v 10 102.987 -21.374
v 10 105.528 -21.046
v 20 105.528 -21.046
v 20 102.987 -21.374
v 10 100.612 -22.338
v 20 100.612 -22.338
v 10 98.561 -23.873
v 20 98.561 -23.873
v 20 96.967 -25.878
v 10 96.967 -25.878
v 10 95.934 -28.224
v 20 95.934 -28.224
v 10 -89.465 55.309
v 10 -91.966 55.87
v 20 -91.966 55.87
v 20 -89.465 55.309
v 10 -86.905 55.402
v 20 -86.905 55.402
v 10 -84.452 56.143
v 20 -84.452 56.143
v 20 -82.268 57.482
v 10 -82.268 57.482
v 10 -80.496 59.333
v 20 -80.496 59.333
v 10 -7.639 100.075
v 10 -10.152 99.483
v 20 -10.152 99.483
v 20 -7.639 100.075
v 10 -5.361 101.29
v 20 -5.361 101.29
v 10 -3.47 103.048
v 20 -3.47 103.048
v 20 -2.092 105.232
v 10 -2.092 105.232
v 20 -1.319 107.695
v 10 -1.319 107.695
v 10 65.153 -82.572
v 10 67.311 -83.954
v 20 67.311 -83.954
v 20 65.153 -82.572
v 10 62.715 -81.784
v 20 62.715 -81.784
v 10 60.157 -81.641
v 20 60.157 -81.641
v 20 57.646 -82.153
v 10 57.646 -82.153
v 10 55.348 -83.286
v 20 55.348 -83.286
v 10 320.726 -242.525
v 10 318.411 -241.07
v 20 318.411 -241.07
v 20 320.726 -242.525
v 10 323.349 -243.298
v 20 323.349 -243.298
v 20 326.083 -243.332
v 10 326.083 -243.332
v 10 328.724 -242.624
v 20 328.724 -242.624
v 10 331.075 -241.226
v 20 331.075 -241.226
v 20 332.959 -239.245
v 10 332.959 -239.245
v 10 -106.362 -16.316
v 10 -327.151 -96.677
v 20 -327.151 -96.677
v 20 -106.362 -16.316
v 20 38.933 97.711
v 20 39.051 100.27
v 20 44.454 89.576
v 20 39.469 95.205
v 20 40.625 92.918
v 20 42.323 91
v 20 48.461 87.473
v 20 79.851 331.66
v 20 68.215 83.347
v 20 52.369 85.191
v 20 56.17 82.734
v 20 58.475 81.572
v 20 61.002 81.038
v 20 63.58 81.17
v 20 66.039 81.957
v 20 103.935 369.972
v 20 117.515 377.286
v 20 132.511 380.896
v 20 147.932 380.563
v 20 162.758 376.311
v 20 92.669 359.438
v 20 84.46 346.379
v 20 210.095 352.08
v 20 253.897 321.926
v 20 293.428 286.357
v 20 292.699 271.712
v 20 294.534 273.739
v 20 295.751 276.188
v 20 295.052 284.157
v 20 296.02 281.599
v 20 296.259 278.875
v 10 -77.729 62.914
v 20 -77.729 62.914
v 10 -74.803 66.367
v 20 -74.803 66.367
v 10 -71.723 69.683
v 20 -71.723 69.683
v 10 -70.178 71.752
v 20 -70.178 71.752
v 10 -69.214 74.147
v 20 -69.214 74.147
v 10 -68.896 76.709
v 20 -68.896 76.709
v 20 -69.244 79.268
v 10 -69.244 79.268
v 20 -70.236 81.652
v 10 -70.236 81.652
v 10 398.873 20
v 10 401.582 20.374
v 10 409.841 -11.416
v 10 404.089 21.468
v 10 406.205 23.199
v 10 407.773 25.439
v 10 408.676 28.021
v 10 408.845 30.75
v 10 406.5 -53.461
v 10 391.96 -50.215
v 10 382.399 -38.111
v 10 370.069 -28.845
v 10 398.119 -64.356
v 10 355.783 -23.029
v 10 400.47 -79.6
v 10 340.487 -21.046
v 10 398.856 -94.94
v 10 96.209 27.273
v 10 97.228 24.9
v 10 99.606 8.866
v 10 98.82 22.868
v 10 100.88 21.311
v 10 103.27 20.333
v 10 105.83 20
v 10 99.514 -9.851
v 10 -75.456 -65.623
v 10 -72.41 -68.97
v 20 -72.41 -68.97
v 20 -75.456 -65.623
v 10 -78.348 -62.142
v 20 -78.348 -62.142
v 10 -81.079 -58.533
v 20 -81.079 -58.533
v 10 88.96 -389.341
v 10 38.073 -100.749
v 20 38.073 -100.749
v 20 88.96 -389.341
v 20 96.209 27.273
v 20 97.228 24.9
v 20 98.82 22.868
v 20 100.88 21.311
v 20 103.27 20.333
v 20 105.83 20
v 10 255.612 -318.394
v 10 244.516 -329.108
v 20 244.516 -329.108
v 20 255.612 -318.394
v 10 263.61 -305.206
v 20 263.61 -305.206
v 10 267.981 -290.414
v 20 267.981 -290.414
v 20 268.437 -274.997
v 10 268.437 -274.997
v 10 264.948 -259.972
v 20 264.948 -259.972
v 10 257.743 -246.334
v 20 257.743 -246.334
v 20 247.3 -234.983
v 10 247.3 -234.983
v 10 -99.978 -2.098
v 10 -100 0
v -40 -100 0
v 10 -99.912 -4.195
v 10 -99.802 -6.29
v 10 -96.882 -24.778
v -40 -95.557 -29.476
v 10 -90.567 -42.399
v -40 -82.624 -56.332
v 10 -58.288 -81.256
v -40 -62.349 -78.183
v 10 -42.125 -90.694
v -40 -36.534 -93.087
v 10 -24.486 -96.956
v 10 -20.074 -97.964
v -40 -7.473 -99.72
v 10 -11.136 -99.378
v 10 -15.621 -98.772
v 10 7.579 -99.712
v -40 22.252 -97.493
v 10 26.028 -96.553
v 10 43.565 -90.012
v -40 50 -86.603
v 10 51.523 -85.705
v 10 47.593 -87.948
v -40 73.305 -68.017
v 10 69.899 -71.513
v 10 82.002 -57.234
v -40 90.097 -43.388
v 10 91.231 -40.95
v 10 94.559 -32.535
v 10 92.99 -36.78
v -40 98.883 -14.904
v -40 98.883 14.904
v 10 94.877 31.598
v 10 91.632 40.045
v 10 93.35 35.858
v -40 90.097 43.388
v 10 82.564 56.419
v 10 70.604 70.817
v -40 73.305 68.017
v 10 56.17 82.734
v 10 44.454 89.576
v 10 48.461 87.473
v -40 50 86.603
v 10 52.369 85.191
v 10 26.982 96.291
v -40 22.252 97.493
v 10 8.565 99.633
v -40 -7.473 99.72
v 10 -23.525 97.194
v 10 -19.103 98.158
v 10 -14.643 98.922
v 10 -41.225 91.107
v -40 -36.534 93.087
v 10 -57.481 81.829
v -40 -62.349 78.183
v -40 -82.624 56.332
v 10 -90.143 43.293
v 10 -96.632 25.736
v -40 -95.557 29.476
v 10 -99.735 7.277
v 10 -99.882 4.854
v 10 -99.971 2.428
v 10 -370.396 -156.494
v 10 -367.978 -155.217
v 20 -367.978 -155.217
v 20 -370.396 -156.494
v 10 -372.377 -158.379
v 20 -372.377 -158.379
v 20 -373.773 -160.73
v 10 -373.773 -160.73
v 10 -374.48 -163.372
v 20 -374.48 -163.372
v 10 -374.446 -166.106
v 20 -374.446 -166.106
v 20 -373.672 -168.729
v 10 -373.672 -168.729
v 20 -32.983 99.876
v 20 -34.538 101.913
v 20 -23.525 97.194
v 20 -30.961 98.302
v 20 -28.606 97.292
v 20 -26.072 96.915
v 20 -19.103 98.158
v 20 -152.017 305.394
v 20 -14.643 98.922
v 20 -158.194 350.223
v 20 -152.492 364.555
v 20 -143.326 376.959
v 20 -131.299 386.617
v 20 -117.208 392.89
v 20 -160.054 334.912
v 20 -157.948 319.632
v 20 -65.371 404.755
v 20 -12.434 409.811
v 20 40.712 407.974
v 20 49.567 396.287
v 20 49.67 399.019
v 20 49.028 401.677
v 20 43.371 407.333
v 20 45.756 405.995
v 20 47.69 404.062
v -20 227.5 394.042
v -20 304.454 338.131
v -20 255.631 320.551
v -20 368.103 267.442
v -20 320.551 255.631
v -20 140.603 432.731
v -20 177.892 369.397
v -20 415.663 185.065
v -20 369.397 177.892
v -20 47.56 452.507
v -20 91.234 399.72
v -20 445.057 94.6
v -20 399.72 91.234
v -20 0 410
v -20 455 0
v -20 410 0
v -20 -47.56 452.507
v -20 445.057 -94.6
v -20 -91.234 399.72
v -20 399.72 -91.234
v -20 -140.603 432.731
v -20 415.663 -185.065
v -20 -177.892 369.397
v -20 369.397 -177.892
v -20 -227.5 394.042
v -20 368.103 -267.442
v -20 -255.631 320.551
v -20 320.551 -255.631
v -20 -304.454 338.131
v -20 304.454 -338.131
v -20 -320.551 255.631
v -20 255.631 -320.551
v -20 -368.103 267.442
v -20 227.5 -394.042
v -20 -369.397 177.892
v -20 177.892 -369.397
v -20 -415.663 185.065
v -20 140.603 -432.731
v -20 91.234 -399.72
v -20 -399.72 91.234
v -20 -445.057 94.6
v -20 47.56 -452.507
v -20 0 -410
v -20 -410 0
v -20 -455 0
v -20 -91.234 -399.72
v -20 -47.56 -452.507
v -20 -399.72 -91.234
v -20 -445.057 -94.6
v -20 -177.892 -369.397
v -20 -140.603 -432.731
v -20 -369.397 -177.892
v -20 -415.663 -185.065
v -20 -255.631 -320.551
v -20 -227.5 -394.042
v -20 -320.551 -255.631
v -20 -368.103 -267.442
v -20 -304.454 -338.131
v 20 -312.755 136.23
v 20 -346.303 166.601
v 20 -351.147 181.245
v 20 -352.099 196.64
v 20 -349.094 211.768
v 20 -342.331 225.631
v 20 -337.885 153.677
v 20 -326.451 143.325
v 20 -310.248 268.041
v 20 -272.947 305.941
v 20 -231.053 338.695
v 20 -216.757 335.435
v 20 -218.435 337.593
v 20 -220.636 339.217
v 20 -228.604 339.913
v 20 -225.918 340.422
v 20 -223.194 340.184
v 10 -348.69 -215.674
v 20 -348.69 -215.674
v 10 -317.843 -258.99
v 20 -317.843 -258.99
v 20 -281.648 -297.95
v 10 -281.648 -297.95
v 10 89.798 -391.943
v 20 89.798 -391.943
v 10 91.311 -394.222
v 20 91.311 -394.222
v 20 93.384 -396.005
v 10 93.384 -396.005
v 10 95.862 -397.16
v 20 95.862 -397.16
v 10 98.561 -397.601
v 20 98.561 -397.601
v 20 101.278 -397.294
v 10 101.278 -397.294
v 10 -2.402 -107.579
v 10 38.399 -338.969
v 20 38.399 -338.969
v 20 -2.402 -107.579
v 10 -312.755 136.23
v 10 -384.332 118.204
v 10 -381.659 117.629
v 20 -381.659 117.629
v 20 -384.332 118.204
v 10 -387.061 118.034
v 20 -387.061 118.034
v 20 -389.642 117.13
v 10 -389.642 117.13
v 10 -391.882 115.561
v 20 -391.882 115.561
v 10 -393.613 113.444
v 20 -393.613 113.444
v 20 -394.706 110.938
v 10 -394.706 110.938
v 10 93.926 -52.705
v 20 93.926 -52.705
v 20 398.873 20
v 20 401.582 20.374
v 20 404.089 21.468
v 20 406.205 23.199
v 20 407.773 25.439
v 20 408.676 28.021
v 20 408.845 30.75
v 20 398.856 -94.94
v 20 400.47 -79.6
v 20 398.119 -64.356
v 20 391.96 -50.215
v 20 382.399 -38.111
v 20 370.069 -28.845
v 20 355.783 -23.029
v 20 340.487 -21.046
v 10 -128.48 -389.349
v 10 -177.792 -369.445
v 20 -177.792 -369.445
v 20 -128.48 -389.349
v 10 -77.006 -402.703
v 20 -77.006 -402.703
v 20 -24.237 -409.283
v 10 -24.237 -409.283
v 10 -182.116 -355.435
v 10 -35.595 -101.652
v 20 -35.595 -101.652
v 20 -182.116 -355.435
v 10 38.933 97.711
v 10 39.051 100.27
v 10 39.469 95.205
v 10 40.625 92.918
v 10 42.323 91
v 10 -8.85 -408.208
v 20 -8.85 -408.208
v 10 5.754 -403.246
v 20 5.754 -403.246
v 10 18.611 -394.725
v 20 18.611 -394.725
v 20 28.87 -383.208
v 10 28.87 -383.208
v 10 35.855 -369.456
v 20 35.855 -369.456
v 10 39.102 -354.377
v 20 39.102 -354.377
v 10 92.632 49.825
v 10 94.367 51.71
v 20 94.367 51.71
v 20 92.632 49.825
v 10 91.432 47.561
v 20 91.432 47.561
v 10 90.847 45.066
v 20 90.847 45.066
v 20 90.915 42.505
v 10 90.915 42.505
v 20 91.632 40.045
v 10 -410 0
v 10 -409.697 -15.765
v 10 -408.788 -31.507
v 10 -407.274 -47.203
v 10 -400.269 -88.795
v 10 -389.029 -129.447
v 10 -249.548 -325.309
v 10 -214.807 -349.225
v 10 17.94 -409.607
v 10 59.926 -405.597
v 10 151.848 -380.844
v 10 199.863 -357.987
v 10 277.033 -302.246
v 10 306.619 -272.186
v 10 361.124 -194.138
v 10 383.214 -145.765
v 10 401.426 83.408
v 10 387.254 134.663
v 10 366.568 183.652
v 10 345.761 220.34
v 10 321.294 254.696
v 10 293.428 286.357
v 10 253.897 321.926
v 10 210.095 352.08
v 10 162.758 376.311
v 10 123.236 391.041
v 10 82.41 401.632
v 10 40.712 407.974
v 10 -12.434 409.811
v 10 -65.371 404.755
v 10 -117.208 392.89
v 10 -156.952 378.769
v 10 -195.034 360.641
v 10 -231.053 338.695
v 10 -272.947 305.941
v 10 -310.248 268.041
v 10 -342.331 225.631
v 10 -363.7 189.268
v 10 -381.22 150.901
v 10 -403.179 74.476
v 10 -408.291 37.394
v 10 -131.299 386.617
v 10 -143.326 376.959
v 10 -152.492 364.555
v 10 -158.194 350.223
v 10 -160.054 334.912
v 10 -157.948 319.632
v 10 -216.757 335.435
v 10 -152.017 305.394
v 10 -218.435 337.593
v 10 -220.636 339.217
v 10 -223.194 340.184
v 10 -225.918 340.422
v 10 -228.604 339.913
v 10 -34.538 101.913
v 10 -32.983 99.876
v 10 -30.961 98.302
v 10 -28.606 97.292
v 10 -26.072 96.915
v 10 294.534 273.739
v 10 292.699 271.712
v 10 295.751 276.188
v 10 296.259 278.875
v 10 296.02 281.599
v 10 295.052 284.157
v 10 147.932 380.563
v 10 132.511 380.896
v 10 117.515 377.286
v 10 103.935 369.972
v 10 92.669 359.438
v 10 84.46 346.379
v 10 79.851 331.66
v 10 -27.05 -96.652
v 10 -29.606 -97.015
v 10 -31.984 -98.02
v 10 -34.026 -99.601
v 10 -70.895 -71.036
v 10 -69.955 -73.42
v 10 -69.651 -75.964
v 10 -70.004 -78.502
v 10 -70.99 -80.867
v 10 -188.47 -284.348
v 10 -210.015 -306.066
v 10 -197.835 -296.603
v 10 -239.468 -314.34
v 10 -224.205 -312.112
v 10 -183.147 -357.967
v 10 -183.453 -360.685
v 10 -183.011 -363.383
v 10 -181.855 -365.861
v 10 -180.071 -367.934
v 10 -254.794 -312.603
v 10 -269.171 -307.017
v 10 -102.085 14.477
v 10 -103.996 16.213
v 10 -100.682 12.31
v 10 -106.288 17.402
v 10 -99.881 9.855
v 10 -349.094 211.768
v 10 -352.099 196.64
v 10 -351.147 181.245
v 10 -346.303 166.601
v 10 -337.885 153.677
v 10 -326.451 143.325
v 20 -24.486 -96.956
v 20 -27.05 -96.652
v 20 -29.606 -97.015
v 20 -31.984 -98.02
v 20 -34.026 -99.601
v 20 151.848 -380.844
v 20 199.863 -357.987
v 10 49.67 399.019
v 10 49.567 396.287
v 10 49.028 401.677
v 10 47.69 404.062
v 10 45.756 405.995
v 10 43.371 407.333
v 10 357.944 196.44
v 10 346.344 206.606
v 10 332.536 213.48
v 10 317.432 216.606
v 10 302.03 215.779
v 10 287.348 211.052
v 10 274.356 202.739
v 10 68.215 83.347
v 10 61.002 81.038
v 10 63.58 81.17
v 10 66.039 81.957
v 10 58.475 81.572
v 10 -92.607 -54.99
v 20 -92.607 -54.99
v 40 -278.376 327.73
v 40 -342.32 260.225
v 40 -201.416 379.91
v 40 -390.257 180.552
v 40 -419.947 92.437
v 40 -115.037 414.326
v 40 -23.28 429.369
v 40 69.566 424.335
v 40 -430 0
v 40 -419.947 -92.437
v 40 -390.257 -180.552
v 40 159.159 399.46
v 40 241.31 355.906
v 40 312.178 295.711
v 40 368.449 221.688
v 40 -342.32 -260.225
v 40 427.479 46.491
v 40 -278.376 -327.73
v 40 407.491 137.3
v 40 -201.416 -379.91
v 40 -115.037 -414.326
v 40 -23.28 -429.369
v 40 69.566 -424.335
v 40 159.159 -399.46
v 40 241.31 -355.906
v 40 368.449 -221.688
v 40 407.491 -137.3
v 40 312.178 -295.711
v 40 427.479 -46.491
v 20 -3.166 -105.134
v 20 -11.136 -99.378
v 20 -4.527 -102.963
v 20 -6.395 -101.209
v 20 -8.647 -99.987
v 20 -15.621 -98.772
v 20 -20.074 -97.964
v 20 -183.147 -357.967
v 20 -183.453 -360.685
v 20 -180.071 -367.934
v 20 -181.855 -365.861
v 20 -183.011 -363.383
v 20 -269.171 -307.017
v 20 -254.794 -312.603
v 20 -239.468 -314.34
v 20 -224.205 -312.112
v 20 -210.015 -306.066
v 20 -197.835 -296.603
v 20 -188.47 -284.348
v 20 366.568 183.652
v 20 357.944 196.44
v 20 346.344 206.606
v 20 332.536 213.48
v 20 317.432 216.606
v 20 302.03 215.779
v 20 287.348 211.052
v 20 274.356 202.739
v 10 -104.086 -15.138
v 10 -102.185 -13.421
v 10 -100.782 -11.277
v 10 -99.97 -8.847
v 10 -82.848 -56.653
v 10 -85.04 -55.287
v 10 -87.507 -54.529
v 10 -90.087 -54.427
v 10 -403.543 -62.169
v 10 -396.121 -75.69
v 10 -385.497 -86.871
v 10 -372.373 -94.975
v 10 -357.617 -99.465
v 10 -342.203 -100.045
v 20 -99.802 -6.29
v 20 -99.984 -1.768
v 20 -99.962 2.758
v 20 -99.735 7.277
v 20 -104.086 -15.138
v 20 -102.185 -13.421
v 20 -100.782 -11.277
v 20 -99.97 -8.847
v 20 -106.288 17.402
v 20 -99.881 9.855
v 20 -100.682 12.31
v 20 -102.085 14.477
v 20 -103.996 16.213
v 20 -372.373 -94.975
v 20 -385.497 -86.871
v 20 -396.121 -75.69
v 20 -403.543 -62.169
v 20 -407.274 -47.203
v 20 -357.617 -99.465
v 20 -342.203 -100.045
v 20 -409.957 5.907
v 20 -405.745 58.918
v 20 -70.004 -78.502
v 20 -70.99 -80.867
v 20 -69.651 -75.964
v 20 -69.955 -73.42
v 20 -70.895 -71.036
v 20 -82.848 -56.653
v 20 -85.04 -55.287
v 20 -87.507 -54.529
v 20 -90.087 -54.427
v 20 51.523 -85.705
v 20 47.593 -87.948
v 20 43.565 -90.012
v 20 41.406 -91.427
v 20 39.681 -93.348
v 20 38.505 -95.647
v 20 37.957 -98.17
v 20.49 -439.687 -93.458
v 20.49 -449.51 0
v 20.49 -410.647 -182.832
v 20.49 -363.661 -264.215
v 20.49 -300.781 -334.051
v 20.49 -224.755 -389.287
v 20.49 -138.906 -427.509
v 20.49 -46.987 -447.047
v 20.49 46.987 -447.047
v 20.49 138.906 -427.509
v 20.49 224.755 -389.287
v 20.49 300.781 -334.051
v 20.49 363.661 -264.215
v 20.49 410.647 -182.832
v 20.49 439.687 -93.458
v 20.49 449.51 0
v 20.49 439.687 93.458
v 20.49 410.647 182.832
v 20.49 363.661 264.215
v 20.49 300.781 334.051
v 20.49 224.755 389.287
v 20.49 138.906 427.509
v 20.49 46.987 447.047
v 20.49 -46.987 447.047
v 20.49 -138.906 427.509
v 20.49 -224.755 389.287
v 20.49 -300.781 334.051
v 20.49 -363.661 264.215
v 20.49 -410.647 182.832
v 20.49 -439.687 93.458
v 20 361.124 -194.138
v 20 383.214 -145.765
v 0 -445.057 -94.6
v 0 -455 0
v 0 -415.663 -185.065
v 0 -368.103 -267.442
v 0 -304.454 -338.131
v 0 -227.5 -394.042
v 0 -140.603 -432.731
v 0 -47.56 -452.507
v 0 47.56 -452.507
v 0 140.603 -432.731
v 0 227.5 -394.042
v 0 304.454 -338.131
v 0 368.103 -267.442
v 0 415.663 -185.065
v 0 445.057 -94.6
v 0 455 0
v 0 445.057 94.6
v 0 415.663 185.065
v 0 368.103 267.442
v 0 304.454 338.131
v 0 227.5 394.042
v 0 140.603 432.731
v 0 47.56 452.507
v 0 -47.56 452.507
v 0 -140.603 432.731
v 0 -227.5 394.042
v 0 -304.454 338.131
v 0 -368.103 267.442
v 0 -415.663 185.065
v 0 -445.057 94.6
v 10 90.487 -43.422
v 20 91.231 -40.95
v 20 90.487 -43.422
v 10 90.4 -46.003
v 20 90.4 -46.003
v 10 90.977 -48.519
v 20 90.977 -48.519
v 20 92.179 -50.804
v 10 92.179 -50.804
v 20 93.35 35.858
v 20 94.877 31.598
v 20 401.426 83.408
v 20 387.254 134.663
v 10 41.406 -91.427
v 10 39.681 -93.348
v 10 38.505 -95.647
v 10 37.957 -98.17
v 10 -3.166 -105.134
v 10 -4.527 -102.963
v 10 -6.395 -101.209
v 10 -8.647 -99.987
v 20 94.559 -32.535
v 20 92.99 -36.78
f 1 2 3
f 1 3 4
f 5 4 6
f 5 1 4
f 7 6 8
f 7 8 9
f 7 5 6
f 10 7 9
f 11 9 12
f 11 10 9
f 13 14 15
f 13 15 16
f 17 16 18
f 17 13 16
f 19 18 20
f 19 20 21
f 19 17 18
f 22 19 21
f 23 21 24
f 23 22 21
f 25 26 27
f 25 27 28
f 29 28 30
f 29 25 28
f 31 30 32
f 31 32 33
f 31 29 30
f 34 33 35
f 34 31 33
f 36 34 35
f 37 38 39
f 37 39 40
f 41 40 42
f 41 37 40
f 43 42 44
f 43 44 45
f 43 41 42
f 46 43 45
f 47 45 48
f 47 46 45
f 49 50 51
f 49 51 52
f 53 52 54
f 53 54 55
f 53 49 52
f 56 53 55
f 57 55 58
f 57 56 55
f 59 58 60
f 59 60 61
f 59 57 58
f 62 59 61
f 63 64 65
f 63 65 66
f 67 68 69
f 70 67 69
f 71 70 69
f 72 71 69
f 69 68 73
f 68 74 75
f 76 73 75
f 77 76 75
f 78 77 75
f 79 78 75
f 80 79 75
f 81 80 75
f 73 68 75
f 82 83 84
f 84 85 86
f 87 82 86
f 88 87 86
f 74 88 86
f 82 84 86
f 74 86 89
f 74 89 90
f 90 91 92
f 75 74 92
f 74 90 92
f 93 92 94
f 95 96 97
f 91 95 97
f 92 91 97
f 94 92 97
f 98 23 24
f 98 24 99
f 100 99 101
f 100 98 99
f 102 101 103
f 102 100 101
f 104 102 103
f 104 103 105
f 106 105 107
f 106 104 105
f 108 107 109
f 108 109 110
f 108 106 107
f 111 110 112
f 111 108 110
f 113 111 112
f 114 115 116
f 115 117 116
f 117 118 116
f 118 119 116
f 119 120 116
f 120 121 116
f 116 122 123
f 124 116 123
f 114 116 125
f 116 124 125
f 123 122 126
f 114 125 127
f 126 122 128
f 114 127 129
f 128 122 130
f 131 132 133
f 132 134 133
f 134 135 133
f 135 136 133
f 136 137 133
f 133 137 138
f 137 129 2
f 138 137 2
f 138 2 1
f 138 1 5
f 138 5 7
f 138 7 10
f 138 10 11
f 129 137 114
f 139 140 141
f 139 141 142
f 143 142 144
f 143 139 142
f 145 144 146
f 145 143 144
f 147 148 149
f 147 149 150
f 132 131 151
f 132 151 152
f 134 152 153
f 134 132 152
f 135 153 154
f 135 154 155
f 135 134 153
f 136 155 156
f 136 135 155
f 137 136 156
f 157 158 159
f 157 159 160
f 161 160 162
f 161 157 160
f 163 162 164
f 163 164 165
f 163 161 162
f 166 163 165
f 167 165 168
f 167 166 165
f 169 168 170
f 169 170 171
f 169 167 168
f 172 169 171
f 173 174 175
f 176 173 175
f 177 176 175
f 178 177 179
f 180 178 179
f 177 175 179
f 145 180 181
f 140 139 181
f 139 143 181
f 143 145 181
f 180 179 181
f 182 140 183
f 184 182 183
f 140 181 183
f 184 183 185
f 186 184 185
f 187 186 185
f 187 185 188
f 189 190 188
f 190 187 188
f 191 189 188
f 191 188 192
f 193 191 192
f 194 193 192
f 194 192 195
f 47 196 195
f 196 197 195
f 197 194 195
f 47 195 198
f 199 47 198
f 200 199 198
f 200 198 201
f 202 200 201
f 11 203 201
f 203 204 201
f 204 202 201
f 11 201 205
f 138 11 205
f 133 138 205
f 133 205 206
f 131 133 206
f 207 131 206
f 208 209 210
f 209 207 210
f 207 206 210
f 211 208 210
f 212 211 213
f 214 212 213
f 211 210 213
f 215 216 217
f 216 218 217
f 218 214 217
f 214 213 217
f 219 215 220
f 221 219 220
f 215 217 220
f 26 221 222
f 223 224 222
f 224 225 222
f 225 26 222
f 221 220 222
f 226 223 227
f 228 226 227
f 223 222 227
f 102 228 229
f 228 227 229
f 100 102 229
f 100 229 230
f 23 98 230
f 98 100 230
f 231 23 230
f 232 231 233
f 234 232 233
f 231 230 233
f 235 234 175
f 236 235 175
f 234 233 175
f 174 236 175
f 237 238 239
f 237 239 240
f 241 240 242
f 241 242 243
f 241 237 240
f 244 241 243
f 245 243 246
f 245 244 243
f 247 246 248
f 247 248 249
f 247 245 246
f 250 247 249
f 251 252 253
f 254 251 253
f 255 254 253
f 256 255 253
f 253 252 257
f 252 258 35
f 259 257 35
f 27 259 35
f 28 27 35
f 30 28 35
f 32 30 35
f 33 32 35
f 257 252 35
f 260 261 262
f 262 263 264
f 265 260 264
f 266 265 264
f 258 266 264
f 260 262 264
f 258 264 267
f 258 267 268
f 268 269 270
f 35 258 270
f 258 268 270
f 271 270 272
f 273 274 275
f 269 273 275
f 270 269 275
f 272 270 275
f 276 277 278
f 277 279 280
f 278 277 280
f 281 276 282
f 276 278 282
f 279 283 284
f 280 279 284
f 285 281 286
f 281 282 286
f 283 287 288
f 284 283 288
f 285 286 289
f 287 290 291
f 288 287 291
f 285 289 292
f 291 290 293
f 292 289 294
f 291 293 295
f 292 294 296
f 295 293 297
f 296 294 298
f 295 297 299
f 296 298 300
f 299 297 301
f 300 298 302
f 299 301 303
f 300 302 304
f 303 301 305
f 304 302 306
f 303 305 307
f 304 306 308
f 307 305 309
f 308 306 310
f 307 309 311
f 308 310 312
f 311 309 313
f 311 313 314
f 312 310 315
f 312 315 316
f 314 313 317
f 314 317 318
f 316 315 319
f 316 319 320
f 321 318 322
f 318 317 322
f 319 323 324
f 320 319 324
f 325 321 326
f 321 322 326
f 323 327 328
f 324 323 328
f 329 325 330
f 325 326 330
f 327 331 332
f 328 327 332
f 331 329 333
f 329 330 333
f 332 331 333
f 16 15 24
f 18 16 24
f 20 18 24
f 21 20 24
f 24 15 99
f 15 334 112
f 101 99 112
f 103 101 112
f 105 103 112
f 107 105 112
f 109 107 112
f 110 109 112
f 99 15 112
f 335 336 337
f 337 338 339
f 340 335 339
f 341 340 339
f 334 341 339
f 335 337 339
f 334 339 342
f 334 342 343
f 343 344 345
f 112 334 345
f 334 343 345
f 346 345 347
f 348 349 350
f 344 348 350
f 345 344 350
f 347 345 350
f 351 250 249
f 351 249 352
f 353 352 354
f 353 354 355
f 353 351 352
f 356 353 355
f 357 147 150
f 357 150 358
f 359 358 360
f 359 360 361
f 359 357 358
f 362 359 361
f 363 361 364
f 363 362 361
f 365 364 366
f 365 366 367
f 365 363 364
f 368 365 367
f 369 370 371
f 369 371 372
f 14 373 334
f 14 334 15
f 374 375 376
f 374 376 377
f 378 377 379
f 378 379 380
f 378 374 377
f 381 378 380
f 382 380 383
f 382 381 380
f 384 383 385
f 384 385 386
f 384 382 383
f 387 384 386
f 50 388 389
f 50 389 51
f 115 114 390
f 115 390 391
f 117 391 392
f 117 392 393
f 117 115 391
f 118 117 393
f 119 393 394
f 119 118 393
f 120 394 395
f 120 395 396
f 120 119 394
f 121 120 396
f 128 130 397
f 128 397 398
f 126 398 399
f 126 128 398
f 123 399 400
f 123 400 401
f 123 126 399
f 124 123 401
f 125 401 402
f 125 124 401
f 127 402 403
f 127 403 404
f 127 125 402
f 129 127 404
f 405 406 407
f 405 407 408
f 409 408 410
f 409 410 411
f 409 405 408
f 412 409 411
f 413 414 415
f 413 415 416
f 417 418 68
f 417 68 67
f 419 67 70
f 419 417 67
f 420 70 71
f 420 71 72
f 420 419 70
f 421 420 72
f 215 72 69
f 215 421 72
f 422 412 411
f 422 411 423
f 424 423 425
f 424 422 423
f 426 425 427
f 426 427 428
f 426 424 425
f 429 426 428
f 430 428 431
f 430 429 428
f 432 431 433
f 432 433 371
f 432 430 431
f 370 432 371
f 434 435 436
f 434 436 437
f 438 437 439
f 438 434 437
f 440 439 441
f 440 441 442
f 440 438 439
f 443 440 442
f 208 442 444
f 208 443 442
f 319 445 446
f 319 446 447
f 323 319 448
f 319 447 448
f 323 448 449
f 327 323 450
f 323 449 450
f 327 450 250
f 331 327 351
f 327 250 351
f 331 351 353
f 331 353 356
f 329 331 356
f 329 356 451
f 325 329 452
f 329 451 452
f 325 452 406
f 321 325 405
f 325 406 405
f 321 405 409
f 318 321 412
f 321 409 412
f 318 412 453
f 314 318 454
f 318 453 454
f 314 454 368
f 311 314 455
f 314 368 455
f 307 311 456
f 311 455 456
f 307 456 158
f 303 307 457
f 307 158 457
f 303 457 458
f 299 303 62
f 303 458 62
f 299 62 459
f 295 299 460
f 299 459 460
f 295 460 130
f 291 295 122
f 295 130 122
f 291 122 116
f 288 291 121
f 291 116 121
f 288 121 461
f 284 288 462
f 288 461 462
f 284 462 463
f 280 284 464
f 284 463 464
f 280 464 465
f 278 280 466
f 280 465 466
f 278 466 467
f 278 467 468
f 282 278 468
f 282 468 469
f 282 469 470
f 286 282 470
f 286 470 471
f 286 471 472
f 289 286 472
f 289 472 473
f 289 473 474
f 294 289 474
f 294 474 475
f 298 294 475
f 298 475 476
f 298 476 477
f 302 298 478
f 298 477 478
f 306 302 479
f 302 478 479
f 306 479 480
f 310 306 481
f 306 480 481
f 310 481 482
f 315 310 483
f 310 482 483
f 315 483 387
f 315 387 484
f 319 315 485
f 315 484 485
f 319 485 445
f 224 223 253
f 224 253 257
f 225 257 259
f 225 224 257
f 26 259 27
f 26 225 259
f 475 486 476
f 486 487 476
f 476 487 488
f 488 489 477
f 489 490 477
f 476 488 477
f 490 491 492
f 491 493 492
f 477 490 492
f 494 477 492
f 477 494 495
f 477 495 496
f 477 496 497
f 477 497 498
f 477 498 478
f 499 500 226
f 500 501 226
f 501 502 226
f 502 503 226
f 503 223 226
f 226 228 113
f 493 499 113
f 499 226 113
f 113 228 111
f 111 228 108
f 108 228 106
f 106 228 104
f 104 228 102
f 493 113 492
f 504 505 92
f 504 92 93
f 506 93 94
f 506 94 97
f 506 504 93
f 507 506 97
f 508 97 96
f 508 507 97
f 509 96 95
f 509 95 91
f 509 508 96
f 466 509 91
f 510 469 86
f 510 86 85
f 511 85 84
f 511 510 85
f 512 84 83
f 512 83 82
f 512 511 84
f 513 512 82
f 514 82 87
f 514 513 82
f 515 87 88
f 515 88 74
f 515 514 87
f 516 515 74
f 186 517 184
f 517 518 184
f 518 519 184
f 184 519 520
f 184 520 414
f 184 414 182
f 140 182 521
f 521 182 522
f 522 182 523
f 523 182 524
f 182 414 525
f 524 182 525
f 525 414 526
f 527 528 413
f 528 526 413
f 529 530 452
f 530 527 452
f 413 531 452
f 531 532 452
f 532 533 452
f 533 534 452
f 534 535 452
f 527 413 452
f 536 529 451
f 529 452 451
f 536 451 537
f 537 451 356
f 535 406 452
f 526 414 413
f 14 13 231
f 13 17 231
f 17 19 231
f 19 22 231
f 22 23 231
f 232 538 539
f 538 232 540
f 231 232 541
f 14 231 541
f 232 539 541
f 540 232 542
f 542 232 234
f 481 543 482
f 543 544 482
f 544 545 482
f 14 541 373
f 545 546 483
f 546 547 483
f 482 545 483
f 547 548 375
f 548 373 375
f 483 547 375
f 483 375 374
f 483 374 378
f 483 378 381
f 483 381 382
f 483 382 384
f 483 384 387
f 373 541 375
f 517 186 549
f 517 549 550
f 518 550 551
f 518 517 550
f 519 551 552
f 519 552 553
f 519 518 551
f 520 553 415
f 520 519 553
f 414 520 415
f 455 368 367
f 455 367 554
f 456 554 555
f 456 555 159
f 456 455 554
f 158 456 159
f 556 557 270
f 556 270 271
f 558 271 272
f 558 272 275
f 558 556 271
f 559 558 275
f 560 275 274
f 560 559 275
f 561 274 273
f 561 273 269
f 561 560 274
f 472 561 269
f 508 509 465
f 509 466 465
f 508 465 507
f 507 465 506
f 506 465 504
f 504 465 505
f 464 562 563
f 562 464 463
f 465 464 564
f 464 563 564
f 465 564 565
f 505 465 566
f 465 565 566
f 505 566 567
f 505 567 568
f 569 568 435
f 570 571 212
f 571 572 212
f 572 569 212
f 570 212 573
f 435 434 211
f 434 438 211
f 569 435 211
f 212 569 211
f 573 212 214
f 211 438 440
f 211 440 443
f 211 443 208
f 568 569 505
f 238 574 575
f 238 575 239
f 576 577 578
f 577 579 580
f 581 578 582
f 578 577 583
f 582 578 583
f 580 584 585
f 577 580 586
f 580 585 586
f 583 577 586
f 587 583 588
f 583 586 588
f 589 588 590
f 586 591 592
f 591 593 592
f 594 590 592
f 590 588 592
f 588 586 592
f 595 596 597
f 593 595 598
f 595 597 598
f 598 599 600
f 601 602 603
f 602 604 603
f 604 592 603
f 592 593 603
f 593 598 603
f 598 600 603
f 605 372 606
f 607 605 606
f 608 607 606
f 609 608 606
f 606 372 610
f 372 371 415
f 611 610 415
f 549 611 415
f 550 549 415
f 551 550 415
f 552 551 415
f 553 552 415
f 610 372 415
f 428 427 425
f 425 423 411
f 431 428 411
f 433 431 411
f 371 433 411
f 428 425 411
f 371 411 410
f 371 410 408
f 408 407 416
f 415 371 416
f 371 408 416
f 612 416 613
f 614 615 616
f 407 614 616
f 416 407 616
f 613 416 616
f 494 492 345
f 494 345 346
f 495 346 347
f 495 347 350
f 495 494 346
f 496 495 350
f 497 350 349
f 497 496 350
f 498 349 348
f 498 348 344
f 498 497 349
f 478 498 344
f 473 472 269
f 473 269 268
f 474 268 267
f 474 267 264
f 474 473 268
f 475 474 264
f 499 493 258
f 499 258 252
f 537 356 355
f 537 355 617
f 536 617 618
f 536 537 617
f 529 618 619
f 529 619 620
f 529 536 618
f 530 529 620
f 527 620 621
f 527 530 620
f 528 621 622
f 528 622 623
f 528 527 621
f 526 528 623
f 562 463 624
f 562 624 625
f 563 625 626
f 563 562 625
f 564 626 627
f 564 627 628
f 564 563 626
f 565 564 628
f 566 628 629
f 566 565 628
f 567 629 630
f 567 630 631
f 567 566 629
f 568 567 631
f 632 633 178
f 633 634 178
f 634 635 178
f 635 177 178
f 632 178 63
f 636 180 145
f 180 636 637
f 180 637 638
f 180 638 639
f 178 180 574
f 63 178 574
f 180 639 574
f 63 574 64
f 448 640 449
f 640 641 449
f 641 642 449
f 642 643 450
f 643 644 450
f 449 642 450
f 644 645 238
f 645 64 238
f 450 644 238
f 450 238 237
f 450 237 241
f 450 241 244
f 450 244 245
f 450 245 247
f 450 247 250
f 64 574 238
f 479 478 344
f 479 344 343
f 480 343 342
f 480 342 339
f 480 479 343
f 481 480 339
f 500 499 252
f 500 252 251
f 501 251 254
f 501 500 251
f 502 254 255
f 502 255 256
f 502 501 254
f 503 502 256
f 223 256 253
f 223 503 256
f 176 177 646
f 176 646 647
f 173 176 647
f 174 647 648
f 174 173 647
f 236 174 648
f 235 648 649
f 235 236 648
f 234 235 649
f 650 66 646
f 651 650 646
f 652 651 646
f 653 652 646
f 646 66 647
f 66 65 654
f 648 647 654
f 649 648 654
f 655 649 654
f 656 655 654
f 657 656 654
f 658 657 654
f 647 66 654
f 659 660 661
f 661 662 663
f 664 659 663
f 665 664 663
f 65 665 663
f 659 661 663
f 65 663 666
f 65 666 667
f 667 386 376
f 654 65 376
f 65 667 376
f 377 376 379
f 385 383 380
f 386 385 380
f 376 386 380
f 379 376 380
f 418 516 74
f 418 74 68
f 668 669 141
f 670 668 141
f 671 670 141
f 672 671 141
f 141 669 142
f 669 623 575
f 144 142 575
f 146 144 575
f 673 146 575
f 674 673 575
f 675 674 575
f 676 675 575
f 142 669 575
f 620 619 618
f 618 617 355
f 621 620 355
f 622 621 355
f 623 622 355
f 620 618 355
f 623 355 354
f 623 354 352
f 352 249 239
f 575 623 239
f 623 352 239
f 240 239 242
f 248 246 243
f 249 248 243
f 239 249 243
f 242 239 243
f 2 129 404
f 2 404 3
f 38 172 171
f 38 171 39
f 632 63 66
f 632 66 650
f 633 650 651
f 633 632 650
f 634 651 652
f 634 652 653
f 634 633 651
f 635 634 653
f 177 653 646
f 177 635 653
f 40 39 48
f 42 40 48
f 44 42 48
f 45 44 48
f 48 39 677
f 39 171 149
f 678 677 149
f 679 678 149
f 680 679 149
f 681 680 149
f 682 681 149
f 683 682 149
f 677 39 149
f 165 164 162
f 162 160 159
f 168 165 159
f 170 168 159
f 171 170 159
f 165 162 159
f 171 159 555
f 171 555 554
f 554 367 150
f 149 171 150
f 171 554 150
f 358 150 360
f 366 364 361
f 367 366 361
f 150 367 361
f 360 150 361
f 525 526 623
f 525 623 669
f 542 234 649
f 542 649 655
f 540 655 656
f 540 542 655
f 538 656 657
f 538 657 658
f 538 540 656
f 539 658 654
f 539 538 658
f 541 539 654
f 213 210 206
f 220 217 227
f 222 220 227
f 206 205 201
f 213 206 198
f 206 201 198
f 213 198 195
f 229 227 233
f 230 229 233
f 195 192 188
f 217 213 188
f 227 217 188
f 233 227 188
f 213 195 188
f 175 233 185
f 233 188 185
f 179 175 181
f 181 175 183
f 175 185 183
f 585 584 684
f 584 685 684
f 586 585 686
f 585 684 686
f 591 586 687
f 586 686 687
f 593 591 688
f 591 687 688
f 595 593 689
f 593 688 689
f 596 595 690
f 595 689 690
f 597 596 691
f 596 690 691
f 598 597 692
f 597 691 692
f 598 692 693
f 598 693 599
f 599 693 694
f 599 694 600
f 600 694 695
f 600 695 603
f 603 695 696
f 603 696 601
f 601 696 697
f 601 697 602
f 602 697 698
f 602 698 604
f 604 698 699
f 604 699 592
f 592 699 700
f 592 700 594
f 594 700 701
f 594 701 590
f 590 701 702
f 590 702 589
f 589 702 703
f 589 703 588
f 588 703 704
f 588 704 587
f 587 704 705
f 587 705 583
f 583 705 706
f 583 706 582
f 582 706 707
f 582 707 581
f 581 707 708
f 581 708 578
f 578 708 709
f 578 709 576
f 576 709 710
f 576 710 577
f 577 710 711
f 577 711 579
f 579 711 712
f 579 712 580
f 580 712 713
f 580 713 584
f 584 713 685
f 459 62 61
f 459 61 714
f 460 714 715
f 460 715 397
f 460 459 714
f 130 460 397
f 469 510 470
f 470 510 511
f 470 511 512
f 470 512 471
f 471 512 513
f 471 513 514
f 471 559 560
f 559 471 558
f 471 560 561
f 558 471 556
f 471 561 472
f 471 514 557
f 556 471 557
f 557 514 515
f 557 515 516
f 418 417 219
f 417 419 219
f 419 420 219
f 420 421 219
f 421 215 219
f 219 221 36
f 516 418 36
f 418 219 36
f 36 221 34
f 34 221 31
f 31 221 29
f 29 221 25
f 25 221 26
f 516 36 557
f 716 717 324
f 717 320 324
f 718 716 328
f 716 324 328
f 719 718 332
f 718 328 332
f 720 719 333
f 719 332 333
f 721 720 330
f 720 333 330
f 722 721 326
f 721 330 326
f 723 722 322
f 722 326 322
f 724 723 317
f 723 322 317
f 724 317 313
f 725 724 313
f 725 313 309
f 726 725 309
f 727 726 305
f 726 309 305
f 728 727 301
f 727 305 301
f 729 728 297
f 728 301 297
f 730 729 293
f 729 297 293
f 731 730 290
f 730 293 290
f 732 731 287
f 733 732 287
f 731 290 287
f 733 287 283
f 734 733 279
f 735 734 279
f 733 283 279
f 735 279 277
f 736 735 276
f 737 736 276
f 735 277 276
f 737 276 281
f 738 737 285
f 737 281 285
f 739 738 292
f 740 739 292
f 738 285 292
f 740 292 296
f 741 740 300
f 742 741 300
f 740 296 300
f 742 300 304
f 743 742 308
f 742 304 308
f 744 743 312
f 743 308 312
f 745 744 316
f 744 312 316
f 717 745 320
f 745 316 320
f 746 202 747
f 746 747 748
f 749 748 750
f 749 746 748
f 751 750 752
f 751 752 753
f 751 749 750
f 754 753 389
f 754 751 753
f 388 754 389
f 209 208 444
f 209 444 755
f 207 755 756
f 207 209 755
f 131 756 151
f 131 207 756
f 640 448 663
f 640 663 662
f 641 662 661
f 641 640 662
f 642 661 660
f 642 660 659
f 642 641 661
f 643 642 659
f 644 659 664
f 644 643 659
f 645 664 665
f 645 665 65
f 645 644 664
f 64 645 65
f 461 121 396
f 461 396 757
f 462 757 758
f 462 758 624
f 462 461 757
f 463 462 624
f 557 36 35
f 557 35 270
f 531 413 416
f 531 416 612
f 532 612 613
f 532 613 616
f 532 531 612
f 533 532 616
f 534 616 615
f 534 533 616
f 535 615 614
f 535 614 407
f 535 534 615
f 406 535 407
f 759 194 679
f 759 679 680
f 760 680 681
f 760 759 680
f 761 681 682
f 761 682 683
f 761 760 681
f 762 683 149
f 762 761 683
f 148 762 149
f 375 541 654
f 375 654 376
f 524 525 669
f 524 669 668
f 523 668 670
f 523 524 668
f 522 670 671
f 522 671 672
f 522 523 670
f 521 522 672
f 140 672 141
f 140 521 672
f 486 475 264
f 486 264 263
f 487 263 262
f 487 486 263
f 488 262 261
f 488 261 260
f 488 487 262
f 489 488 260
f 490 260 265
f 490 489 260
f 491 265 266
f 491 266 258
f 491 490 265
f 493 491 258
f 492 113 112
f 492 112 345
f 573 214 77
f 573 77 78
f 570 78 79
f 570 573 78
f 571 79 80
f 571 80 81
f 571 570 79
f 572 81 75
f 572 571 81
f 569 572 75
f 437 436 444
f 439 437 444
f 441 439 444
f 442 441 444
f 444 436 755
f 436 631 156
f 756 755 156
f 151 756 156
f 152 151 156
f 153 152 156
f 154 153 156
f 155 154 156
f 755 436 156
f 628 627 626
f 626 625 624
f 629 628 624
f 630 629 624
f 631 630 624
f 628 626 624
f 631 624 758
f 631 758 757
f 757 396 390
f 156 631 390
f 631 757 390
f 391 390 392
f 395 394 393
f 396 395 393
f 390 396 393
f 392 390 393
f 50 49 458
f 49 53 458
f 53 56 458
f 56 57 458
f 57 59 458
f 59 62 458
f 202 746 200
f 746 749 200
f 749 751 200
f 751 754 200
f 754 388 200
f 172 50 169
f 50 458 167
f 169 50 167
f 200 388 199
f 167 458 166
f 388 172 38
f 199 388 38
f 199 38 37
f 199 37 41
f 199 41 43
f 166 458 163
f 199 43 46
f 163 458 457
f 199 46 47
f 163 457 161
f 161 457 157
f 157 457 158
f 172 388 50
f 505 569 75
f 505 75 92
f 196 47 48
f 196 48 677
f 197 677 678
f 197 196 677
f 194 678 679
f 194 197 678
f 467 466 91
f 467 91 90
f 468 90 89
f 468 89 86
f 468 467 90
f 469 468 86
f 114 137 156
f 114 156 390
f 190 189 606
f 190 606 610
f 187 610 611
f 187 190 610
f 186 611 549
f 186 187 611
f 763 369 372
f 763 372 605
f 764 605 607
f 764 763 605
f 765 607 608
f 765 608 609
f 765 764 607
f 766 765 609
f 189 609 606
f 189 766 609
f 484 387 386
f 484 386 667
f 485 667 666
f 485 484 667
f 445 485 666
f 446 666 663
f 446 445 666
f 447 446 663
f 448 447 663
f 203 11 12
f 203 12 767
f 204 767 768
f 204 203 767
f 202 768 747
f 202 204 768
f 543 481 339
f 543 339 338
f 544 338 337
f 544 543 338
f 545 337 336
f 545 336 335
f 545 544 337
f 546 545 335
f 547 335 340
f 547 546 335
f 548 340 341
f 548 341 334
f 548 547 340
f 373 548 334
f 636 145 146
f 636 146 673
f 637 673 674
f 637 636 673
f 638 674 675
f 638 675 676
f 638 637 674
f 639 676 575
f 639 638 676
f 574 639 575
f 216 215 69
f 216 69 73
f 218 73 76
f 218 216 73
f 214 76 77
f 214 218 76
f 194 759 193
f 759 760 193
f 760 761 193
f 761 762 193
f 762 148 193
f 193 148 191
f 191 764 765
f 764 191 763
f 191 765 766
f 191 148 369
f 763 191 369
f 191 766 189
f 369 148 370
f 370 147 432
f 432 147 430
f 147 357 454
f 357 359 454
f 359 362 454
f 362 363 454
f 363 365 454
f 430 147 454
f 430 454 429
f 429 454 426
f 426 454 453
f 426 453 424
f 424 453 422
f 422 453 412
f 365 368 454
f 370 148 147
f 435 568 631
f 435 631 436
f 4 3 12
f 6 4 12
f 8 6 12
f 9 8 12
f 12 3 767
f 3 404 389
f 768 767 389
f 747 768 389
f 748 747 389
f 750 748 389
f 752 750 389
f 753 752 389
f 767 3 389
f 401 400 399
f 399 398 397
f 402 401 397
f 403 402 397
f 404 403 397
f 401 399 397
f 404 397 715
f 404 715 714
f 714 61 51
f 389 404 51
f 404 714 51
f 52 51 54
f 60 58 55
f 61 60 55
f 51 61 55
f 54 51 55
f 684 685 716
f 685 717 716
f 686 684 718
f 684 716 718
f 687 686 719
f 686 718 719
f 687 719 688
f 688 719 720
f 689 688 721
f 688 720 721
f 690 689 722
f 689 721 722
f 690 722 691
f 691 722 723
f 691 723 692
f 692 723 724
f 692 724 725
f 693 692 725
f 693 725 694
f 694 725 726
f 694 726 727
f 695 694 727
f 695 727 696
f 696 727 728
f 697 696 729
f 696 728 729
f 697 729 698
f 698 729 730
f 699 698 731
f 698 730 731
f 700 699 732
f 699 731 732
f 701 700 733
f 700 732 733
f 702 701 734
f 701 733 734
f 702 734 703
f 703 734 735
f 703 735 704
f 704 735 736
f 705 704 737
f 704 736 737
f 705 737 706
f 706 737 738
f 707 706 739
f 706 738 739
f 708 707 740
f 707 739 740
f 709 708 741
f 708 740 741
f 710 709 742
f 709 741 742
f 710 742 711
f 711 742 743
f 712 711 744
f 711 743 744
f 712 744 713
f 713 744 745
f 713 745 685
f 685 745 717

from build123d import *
from build123d.topology import SkipClean

# Parameters (mm, degrees)
CUT_EXTRUDE3_DEPTH = 10
CIRPATTERN1_COUNT  = 9


with BuildPart() as part:
    # Sketch1 → Revolve1 (revolve)
    with BuildSketch(Plane.XY, mode=Mode.PRIVATE) as revolve1_sk:
        Polygon((-40, 100), (-40, 0), (40, 0), (40, 430), (20.490381057, 449.509618943), (0, 455), (-20, 455), (-20, 410), (10, 410), (10, 100), (-20, 100), align=None)
    revolve(revolve1_sk.sketch.rotate(Axis((-40, 0, 0), (1, 0, 0)), 180), axis=Axis((-40, 0, 0), (1, 0, 0)))

    # Sketch2 → Cut-Extrude3 (cut)
    with SkipClean():  # the faces are left unmerged after this step: merging them gives an invalid solid
        with BuildSketch(Plane.ZY.offset(-10)):
            with BuildLine():
                Line((20, 105.830052443), (20, 398.873413504))
                ThreePointArc((20, 398.873413504), (23.199264746, 406.204852653), (30.75, 408.845248841))
                ThreePointArc((30.75, 408.845248841), (109.265252373, 395.172246778), (183.651957914, 366.567808672))
                ThreePointArc((183.651957914, 366.567808672), (215.530603819, 325.085308606), (202.738728221, 274.356482529))
                Line((202.738728221, 274.356482529), (51.709811994, 94.367229029))
                ThreePointArc((51.709811994, 94.367229029), (46.332346285, 91.059191807), (40.044879602, 91.631913751))
                ThreePointArc((40.044879602, 91.631913751), (33.736520206, 94.137384733), (27.272727273, 96.209138584))
                ThreePointArc((27.272727273, 96.209138584), (22.022759648, 99.799825551), (20, 105.830052443))
            make_face()
        cut_extrude3 = extrude(amount=-CUT_EXTRUDE3_DEPTH, mode=Mode.SUBTRACT)

    # CirPattern1: Cut-Extrude3 ×9 about axis
    with SkipClean():  # the faces are left unmerged after this step: merging them gives an invalid solid
        cirpattern1_axis = Axis((0, 0, 0), (1, 0, 0))
        for i in range(1, CIRPATTERN1_COUNT):
            add(cut_extrude3.rotate(cirpattern1_axis, i * 360 / CIRPATTERN1_COUNT), mode=Mode.SUBTRACT)


solid = part.part
